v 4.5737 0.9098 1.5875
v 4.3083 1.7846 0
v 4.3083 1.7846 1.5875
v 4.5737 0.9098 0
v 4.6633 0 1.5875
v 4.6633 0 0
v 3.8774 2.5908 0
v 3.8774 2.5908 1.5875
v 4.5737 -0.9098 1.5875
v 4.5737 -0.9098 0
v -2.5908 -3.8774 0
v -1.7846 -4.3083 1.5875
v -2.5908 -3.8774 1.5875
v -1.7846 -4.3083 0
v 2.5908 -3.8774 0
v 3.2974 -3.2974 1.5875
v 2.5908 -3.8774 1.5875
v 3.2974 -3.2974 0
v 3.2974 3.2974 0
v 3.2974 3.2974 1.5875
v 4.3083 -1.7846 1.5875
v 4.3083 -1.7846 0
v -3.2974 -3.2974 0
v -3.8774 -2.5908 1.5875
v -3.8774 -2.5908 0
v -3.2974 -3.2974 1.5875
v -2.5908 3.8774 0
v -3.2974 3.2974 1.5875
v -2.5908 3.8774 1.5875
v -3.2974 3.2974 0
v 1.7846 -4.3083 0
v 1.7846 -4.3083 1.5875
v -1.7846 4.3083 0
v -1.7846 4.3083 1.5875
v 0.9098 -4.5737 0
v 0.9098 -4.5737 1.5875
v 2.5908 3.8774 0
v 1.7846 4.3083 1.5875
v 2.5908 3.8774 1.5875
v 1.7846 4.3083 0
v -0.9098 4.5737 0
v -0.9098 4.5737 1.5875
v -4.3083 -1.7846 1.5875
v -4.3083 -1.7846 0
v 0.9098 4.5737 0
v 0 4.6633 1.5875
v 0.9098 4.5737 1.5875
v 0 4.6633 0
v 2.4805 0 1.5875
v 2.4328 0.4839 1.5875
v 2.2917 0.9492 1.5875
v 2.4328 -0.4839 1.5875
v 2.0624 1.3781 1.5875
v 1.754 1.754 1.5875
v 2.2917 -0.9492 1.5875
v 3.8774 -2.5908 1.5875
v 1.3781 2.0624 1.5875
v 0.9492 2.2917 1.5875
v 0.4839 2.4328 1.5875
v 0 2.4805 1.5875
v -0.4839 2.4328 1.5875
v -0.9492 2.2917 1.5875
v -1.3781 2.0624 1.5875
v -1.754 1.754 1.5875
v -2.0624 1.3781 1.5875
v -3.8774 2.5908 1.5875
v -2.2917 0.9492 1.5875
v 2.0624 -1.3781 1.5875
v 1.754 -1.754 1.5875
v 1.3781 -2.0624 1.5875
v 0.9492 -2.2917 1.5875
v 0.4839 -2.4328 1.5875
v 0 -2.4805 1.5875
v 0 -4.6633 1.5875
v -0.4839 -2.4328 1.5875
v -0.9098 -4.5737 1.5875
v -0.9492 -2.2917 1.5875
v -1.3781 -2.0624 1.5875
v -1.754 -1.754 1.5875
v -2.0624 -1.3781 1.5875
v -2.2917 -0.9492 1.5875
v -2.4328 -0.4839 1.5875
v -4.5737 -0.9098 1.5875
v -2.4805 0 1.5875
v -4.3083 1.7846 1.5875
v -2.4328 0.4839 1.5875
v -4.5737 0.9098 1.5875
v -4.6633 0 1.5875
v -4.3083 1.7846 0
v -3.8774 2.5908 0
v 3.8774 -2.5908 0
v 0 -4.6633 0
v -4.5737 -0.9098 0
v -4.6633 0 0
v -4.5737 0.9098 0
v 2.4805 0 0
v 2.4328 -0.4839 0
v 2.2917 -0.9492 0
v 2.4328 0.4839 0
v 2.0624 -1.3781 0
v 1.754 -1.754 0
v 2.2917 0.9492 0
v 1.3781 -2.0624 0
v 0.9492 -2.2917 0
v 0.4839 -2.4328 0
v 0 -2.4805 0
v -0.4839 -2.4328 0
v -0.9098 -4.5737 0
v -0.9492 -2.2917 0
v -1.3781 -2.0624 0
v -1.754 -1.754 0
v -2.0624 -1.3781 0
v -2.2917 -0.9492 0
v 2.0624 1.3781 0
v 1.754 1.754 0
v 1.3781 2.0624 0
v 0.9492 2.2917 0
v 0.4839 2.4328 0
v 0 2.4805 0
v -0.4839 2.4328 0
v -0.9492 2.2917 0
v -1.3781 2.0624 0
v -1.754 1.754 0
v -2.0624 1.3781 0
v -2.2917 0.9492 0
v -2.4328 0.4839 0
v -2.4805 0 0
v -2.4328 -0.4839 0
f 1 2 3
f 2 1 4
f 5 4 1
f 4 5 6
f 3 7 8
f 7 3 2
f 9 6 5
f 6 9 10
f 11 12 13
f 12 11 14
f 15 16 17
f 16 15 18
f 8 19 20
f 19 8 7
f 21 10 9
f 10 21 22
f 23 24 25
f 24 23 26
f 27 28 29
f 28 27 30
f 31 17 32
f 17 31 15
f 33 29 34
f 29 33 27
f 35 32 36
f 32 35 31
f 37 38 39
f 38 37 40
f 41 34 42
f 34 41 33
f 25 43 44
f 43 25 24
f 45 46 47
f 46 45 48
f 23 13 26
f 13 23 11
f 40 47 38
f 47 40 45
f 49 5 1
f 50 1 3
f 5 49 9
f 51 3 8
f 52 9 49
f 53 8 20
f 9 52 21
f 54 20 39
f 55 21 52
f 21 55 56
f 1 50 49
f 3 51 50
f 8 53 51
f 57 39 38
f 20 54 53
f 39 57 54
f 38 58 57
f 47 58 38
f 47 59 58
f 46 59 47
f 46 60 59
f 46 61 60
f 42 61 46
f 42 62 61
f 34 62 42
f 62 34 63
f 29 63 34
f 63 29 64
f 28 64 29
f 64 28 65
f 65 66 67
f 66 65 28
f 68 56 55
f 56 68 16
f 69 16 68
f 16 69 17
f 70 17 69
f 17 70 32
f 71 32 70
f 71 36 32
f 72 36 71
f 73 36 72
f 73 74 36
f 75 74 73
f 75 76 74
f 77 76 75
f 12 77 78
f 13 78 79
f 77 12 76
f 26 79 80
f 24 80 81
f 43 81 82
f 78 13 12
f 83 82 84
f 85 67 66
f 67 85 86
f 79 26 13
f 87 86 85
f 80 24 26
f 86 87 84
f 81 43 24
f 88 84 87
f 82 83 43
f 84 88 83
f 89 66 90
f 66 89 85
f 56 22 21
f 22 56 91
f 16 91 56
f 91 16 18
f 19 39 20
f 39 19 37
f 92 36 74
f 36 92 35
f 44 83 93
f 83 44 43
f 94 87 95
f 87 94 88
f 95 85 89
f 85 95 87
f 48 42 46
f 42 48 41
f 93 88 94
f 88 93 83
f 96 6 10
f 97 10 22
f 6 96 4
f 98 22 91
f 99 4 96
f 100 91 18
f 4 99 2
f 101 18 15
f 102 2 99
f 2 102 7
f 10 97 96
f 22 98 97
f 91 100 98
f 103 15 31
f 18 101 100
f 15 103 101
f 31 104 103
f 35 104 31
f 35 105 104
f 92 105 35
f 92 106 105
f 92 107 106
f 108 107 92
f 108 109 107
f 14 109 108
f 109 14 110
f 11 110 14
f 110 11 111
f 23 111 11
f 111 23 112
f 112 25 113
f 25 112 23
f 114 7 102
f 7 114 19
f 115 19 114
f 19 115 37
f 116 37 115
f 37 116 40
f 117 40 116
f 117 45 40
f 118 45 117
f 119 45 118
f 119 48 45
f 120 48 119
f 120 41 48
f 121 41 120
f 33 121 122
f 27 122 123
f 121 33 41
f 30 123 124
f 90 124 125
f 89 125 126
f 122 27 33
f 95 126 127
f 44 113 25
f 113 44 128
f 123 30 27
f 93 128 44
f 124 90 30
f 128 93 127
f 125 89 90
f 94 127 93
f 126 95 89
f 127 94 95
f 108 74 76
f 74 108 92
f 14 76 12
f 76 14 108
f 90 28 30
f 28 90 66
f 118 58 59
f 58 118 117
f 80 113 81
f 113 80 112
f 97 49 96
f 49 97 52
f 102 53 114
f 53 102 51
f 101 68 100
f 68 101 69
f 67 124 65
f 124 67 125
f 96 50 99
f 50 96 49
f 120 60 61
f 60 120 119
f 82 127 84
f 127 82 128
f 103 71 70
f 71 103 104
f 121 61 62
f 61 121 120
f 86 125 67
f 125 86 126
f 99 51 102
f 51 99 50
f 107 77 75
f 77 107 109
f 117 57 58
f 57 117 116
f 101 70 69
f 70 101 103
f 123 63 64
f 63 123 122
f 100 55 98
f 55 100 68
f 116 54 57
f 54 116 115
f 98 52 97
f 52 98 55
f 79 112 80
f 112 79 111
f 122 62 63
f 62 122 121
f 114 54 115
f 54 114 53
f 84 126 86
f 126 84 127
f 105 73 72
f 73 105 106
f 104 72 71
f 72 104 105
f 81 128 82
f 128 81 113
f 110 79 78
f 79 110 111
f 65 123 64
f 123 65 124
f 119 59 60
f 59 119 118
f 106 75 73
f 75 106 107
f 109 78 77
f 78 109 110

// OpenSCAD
// file: ../../lib/material.scad
module gray() {
	color([.4, .4, .4]) children([0:$children-1]);
}

module black() {
	color([.3, .3, .3]) children([0:$children-1]);
}

module orange() {
	color([1, .7, 0]) children([0:$children-1]);
}

module yellow() {
	color([.7, .7, .3]) children([0:$children-1]);
}

module green_pcb() {
	color([.0, .5, .25]) children([0:$children-1]);
}

module metal() {
	color([.7, .7, .7]) children([0:$children-1]);
}

module gold() {
	color([.8, .5, .0]) children([0:$children-1]);
}

module stainless(no="1.4301") {
	color([0.45, 0.43, 0.5]) children([0:$children-1]);
}

module steel(no) {
	color([0.65, 0.67, 0.72]) children([0:$children-1]);
}

module iron(no="ST37") {
	color([0.36, 0.33, 0.33]) children([0:$children-1]);
}

module plastic() {
	color([1, .7, 0]) children([0:$children-1]);
}
// main file
include <../../lib/material.scad>;
include <../../lib/bolt/bolt.scad>;

//  washer (outer, inner, width, tolerance, quality, thread);

metal() {
  washer (3/8, 3/16, 1/16, 1/128, 32, "imperial");
}

/*

    washer (outer, inner, width, tolerance, quality, thread);
        outer       =   outer washer diameter
        inner       =   inner washer diameter
        tolerance   =   tolerance of entire measures (always positive, addition and subtraction already
                        calculated within the script
        quality     =   overall quality of the returned function (ref. $fn)
        *thread     =   string variable declaring measure type -> "metric" or "imperial"
        
*/
